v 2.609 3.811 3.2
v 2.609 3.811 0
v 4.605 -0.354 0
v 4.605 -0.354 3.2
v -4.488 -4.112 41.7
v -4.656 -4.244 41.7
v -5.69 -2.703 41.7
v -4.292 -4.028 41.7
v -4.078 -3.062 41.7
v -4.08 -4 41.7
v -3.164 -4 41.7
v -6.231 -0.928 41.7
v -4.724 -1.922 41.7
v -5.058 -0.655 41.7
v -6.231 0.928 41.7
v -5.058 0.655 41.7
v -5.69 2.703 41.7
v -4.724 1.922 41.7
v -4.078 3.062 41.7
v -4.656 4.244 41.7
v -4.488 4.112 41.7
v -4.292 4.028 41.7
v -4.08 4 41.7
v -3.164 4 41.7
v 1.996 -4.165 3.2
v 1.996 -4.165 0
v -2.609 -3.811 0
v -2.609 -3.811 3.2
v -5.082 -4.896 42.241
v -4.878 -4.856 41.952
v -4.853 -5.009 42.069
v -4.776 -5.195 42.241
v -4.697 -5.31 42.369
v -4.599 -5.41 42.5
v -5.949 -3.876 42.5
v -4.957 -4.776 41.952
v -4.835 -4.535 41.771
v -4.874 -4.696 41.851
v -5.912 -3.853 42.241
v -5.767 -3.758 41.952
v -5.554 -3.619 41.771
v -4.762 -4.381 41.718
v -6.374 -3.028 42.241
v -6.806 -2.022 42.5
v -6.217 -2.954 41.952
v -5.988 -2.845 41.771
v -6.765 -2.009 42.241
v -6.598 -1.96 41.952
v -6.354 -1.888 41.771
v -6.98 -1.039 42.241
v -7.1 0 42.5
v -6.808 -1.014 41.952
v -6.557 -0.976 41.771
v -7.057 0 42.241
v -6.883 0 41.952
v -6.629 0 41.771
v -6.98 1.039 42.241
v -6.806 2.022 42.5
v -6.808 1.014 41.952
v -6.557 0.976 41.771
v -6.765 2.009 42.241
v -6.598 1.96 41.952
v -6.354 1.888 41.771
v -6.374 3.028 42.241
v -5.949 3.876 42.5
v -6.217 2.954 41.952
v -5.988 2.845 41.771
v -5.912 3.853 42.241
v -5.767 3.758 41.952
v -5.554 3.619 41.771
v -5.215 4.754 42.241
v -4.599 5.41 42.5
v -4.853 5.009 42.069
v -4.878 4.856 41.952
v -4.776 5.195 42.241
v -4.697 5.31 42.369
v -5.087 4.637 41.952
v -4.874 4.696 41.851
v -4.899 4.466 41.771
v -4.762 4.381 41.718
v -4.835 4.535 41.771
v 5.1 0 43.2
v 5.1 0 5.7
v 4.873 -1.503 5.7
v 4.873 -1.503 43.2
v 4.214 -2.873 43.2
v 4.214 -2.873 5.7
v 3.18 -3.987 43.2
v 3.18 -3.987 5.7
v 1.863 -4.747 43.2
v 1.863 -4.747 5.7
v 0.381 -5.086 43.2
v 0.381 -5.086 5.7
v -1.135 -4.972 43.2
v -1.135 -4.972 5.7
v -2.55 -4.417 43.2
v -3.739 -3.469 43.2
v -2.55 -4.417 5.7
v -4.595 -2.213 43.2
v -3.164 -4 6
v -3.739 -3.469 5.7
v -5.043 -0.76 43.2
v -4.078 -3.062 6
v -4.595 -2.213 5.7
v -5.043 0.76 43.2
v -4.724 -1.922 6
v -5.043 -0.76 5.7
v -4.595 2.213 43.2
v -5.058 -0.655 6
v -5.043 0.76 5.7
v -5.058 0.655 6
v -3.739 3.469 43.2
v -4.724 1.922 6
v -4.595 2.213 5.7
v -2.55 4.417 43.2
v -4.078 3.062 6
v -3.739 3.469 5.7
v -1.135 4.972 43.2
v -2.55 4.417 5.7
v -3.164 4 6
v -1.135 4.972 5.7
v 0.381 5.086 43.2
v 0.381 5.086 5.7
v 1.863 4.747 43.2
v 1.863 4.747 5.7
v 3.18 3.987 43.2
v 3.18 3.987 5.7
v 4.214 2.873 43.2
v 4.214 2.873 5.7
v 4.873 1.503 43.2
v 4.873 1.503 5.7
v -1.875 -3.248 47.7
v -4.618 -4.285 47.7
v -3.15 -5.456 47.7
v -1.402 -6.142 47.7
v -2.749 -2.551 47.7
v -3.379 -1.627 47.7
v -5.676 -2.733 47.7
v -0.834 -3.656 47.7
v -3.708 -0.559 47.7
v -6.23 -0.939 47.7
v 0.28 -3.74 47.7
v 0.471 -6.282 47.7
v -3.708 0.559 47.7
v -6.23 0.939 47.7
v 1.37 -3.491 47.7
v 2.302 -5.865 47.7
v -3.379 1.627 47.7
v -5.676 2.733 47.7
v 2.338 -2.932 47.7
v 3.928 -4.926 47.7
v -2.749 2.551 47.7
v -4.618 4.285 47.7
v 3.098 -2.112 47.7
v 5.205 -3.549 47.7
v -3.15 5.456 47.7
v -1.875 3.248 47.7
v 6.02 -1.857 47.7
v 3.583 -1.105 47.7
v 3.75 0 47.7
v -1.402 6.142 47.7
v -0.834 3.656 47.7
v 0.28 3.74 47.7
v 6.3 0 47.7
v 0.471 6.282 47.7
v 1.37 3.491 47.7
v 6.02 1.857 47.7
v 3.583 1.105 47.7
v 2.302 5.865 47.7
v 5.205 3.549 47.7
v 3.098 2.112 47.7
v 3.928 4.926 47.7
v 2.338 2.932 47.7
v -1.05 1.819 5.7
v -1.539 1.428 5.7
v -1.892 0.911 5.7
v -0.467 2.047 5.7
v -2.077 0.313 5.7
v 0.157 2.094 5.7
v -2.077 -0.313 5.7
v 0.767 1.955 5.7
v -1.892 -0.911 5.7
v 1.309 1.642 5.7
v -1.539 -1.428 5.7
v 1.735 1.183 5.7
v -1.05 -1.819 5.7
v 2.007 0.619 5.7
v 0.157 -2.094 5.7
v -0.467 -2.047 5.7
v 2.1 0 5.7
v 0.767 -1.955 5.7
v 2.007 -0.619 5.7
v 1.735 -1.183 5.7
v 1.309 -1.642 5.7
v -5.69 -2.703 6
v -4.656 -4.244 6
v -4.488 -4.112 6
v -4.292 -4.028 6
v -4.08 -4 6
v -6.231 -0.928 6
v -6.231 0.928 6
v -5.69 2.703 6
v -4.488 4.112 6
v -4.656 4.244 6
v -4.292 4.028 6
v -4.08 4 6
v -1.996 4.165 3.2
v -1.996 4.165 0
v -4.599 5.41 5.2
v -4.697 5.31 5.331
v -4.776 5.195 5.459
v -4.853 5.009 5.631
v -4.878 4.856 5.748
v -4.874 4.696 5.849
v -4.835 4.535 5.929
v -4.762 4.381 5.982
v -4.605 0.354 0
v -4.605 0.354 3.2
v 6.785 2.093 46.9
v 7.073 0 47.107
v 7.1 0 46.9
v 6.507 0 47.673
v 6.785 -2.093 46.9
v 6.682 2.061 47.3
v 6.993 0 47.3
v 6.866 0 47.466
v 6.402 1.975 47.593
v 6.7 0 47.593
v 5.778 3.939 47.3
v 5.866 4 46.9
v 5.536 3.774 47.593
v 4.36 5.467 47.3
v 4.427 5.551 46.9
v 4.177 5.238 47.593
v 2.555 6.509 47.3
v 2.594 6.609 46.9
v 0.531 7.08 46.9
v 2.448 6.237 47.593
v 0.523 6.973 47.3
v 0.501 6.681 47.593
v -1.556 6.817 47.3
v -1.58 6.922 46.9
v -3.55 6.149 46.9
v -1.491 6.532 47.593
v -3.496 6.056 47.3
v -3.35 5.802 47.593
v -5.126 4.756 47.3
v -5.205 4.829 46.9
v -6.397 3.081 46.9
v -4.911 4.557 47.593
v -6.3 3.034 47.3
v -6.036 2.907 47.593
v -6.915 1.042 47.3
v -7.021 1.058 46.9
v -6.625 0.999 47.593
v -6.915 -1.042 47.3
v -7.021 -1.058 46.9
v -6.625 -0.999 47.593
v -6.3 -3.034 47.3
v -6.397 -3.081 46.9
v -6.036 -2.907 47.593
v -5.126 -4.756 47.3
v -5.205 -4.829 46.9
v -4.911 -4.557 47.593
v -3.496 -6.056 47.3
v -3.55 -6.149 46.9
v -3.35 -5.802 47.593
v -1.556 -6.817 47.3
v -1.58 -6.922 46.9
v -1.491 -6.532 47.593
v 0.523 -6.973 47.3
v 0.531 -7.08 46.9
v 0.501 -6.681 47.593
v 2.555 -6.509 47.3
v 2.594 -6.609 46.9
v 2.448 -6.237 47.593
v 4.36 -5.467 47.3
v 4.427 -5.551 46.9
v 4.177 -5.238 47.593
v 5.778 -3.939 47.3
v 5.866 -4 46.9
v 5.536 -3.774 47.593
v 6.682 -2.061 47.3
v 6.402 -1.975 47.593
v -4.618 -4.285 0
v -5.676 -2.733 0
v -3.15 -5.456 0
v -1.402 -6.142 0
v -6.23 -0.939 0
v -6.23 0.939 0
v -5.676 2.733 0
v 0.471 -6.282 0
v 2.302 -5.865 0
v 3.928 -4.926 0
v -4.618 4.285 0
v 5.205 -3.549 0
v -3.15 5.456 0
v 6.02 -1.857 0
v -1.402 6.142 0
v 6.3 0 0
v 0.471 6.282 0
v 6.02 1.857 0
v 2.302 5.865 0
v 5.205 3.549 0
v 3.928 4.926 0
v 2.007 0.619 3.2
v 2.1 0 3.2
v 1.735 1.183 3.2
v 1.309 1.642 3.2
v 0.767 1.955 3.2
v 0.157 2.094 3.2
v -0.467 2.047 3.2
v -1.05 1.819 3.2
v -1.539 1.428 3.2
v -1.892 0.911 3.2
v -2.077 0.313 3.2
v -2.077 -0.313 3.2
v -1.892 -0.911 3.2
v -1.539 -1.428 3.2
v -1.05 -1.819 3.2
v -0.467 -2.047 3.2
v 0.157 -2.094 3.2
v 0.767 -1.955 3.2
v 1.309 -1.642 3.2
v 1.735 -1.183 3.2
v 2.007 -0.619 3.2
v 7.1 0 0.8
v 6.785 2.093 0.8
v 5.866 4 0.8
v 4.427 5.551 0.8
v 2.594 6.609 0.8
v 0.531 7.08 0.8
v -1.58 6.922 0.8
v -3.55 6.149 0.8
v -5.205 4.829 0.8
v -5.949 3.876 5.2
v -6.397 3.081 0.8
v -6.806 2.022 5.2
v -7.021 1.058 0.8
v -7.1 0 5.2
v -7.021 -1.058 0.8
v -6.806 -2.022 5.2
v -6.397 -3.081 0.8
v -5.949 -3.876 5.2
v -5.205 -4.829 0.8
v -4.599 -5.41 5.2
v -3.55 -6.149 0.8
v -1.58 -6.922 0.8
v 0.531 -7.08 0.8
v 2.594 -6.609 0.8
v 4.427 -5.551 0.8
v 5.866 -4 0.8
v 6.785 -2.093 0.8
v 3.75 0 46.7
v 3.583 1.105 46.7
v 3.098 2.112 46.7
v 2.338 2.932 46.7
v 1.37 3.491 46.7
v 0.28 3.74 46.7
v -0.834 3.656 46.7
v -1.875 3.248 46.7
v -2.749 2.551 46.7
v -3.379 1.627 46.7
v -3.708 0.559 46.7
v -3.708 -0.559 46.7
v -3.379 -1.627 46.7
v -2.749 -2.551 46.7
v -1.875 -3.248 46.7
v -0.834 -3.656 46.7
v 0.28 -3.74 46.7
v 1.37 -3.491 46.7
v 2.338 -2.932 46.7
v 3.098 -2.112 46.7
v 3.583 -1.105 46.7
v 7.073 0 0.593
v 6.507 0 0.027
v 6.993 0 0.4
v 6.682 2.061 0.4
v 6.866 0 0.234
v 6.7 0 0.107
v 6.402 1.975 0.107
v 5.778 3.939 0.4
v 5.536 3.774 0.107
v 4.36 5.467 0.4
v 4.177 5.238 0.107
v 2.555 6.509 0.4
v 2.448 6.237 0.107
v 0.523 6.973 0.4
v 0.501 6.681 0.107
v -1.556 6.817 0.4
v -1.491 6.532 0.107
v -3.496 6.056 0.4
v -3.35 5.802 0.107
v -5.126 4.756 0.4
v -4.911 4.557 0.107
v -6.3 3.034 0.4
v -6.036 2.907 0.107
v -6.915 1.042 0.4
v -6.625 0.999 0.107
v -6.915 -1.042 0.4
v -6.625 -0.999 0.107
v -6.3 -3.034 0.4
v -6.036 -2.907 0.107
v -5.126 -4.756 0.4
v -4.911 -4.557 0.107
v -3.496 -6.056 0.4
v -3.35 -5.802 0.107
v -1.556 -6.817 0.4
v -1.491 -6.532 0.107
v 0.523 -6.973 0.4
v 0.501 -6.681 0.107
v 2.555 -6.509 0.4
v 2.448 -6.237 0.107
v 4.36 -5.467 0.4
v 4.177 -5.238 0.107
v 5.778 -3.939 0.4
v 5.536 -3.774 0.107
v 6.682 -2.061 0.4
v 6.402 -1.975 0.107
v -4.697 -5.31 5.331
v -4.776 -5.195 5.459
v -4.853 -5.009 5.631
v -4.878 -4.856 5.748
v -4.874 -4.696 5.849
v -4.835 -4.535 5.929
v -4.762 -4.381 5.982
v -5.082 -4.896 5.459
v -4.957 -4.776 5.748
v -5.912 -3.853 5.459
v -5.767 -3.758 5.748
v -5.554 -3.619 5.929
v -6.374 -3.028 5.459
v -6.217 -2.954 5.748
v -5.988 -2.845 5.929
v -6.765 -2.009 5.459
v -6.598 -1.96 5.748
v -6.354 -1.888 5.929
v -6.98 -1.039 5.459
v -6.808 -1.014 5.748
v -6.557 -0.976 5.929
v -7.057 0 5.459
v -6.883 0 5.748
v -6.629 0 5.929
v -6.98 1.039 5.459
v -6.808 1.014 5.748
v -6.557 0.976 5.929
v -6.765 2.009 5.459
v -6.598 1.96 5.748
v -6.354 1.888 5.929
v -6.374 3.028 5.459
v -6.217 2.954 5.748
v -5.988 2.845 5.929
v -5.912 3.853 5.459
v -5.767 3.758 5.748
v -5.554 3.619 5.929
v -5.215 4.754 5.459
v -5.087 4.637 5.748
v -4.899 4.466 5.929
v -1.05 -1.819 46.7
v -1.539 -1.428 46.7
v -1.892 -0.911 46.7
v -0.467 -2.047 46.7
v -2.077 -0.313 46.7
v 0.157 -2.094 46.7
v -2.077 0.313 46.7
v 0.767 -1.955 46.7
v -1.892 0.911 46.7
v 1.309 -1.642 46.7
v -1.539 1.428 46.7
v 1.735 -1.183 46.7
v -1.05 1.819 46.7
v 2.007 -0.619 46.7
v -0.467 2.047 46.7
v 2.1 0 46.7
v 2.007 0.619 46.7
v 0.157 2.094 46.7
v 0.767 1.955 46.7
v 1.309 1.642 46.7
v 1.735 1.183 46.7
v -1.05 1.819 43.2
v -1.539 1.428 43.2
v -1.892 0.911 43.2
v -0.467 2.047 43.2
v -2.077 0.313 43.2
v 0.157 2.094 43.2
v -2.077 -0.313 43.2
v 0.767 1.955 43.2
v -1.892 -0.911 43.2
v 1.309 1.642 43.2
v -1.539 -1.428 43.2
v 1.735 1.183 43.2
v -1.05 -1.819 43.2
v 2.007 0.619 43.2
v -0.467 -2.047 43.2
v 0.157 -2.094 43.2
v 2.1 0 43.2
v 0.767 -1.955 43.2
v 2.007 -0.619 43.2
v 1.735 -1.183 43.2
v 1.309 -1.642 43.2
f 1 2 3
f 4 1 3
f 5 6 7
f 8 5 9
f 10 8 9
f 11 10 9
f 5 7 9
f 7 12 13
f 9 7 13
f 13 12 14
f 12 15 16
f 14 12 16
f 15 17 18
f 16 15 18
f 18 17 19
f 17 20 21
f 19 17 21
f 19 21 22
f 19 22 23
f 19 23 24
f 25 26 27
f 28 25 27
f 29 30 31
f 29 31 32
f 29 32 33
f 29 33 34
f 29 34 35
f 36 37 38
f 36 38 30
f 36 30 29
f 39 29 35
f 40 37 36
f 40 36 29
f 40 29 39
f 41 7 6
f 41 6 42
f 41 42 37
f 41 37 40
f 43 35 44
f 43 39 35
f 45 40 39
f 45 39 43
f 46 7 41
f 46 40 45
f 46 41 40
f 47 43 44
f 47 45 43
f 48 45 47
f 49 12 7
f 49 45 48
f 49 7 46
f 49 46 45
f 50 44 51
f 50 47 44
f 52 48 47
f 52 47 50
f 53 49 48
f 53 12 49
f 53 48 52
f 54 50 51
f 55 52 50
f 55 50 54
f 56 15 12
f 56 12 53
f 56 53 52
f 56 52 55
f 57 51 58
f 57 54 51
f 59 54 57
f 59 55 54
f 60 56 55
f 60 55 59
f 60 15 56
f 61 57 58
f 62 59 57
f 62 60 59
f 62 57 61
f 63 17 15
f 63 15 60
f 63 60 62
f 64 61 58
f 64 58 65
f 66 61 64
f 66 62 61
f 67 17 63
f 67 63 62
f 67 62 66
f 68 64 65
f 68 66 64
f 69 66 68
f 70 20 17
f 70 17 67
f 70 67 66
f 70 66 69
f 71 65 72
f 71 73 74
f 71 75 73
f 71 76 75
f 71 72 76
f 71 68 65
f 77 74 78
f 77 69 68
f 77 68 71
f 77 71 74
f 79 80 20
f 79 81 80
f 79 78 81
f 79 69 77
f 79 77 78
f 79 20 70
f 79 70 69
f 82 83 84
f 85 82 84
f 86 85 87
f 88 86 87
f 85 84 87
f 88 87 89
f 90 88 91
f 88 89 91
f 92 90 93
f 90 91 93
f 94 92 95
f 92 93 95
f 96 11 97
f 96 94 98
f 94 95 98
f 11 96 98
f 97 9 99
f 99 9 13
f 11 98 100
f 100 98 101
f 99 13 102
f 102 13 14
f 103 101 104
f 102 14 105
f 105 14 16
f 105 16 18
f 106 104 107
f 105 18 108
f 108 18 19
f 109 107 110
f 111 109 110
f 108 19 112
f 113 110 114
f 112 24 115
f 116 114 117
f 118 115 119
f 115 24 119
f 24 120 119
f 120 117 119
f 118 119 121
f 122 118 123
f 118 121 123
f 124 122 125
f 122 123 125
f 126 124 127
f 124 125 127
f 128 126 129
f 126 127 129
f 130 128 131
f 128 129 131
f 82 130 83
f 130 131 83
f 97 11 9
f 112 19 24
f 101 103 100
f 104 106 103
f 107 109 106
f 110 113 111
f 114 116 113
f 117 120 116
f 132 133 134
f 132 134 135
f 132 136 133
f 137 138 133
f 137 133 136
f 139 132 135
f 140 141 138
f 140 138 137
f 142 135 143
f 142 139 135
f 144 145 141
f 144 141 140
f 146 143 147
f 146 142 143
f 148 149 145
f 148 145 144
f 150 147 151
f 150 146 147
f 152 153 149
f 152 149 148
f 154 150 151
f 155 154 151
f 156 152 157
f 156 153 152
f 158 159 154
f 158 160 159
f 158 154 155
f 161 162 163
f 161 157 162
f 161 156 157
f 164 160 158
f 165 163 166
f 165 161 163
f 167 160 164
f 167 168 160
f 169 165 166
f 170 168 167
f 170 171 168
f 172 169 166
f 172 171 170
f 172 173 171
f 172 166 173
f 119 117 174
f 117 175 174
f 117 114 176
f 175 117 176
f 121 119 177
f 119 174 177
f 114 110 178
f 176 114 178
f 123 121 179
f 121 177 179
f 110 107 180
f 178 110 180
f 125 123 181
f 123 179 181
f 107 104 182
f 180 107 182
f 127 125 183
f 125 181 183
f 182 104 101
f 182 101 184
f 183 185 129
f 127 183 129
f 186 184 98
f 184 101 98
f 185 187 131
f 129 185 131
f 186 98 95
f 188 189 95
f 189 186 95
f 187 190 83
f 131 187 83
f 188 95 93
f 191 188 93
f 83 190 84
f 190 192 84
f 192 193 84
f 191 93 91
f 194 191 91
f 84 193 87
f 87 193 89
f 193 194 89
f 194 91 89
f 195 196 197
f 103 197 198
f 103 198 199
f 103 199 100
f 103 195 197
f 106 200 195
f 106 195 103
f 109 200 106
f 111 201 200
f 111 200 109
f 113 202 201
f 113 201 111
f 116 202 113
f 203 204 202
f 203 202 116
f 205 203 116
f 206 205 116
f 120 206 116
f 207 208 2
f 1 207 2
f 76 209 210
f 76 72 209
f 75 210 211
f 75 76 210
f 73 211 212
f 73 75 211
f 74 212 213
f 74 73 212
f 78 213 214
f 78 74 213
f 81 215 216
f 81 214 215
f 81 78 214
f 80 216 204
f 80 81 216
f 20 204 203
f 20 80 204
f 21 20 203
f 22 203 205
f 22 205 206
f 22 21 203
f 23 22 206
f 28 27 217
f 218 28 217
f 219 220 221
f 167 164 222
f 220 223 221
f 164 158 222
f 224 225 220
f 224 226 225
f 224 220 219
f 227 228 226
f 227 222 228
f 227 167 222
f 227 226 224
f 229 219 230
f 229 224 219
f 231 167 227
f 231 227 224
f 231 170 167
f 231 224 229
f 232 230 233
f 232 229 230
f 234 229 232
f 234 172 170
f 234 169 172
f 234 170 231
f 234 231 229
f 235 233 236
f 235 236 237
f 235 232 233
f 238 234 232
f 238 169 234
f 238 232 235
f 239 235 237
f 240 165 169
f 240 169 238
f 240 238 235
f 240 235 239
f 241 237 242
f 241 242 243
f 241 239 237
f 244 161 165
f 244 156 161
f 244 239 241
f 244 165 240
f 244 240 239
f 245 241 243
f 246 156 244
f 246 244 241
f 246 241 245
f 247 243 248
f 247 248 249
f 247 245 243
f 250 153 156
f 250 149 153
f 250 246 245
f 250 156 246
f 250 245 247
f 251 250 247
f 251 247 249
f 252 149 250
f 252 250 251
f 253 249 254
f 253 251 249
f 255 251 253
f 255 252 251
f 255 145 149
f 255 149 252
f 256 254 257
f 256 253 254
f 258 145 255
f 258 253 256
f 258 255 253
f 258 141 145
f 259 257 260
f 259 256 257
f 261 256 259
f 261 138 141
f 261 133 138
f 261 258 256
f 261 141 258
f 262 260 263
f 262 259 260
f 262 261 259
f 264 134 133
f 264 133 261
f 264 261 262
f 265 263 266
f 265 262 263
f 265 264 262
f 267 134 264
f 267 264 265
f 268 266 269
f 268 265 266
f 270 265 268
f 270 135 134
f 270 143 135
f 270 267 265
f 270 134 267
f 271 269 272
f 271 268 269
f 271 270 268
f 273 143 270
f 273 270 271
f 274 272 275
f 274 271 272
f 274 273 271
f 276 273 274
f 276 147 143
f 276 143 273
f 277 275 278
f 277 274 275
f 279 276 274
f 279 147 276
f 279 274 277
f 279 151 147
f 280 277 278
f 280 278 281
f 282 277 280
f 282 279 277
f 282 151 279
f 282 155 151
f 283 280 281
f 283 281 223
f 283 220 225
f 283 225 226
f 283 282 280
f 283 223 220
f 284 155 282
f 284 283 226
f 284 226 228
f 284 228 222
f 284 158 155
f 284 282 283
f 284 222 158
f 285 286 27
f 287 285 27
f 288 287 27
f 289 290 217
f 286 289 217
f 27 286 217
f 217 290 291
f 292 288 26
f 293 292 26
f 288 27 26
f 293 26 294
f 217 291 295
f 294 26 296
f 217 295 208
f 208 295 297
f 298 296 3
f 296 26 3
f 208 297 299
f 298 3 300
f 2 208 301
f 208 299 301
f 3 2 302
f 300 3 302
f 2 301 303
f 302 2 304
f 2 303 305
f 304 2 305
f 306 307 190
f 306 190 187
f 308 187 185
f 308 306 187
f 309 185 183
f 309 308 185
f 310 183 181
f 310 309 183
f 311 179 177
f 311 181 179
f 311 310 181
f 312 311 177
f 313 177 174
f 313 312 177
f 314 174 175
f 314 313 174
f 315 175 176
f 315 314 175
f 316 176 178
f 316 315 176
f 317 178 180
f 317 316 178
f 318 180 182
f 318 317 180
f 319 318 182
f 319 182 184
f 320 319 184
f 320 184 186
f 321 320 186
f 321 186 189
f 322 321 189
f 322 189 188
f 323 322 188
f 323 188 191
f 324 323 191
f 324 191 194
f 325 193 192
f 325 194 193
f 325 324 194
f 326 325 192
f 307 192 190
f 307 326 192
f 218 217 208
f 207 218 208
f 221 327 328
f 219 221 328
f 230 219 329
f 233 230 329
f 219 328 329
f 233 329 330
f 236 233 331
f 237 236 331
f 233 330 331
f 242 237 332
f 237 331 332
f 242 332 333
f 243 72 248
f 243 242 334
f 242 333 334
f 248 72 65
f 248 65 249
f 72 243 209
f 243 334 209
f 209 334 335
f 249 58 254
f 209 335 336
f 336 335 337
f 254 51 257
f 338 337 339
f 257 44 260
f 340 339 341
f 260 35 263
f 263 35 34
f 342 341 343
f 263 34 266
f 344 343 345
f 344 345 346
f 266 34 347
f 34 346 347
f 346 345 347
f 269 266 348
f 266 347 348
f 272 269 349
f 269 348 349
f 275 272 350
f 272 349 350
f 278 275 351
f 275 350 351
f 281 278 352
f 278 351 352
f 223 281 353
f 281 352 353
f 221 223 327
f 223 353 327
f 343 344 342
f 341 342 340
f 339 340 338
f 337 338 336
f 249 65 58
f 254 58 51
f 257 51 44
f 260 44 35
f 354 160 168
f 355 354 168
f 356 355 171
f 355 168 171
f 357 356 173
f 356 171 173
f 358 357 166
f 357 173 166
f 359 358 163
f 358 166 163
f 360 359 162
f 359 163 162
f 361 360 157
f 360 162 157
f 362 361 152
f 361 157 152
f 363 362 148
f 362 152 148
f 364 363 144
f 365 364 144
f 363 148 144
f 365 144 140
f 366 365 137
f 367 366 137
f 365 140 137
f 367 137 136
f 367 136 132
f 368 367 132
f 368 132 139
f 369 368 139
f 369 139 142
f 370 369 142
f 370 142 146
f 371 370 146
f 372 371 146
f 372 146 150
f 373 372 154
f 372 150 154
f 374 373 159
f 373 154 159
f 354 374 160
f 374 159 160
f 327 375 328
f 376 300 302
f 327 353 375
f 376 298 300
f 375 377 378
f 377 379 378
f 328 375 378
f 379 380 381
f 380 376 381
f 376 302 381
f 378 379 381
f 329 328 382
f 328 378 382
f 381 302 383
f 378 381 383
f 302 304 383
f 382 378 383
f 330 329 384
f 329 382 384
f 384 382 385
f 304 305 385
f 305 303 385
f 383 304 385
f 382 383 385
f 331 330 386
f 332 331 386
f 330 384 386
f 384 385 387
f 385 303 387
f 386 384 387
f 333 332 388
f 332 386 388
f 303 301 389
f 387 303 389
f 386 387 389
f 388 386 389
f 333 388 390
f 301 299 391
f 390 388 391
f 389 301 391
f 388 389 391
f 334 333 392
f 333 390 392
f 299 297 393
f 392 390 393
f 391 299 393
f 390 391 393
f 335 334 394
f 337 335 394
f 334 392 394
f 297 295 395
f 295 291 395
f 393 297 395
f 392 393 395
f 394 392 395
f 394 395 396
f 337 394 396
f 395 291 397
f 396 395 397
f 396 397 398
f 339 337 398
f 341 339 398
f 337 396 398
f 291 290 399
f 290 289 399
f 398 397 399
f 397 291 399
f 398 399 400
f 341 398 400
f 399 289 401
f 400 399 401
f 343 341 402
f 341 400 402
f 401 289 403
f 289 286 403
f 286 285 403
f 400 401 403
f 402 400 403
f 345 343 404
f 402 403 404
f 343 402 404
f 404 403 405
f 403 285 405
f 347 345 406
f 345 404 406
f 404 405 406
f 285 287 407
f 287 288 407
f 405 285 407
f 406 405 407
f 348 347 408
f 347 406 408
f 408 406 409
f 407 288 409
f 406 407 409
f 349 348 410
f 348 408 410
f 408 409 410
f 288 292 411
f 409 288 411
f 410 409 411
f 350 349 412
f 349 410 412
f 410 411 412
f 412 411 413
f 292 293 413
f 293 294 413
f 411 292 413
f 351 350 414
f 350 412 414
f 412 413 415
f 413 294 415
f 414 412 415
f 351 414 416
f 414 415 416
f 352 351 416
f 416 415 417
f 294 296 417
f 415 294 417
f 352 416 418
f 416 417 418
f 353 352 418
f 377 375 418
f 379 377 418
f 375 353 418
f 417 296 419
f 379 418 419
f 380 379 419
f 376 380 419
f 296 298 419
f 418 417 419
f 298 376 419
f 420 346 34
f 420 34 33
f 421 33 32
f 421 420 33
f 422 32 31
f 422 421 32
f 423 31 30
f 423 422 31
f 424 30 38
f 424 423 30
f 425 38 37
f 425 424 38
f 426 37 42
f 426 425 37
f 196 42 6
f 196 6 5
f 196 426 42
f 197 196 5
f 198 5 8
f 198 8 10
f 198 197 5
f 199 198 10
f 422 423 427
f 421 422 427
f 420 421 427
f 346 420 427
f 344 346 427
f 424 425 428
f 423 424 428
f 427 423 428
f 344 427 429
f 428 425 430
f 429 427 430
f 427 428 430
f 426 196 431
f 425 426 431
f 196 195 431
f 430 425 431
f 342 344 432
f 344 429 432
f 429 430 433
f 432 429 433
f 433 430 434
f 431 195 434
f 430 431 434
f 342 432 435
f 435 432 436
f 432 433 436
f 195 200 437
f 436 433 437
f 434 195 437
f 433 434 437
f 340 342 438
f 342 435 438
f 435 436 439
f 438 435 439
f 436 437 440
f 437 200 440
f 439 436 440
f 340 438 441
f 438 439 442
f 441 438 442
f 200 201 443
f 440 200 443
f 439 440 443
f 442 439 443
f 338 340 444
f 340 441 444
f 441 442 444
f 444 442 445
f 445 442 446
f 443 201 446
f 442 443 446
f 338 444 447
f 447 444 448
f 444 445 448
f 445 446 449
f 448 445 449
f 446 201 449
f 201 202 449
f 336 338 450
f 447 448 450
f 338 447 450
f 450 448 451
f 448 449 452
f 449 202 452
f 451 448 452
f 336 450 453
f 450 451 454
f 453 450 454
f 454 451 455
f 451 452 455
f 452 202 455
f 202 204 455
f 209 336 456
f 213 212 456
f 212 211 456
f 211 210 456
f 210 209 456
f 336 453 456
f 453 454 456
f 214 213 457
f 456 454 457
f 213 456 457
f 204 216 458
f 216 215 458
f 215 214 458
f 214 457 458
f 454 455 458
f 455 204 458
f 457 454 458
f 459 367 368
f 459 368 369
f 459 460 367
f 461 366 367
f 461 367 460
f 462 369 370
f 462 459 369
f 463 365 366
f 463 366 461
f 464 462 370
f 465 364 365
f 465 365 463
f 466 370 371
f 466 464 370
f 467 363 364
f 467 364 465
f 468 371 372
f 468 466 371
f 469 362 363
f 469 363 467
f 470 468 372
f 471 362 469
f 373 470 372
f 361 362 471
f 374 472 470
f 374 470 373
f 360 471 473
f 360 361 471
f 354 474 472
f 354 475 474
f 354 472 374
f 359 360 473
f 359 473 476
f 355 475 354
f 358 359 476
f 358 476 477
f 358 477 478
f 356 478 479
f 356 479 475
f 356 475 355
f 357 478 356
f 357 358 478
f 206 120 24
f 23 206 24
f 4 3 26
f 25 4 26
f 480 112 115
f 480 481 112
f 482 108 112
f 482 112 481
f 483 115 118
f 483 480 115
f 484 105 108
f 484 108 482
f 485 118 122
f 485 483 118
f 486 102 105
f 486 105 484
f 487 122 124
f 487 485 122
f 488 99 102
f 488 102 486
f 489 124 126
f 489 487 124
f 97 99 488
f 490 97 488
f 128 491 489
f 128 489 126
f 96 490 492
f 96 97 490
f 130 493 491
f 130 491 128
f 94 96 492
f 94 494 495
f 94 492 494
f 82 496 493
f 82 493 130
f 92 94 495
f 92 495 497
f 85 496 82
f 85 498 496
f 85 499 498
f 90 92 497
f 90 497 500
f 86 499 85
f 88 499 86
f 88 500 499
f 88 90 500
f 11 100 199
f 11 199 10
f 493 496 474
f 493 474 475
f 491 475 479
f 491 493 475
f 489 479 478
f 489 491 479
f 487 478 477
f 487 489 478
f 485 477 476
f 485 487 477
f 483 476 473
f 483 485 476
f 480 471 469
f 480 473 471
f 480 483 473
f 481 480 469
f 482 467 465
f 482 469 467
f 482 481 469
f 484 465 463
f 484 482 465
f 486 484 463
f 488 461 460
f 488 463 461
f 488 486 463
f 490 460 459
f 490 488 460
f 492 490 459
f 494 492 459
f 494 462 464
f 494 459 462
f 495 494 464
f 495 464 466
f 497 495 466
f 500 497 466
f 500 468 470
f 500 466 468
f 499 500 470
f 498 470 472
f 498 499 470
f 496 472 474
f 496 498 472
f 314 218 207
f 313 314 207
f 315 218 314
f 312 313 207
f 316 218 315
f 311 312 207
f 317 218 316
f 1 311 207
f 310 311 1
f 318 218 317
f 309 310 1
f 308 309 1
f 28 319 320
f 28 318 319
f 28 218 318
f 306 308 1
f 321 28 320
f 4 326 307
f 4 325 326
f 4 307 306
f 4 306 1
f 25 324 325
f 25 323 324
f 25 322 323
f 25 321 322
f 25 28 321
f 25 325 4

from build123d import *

# Parameters (mm, degrees)
F0_R          = 7.1
F0_R_2        = 2.1
F1_DEPTH      = 47.7
F3_DEPTH      = 3.2
F4_R          = 3.75
F5_DEPTH      = 1
F6_W          = 8
F6_H          = 35.7
F7_DEPTH      = 25
F9_START      = -2.5
F8_R          = 5.1
F9_DEPTH      = 37.5
F10_T1_DEPTH  = 35.7
F10_T8_ANGLE  = 100.8666218277
F10_T14_ANGLE = 100.8666218277
F10_T23_DEPTH = 40.4388611997
F10_T27_ANGLE = 100.8666218277
F10_T34_ANGLE = 100.8666218277
F10_T38_DEPTH = 40.4388611997
F10_T45_DEPTH = 40.4388611997
F10_T49_ANGLE = 100.8666218277
F10_T56_DEPTH = 40.4388611997
F10_T60_ANGLE = 100.8666218277


# Not quite as in the source:
# - a fillet or chamfer that OpenCascade refuses, or shapes differently, is made with other operations: its cross-section is extruded or revolved along the edge and cut away or added


with BuildPart() as f1:
    # F0 (on Top) → F1 (new body)
    with BuildSketch(Plane.XY):
        Circle(F0_R)
        Circle(F0_R_2, mode=Mode.SUBTRACT)
    extrude(amount=F1_DEPTH)

    # F2 (on face) → F3 (cut)
    with BuildSketch(Plane(origin=(0, 0, 0), x_dir=(1, 0, 0), z_dir=(0, 0, -1))):
        Polygon((2.6088002978, -3.8114950268), (4.6052516685, 0.3535398179), (1.9964513707, 4.1650348447), (-2.6088002978, 3.8114950268), (-4.6052516685, -0.3535398179), (-1.9964513707, -4.1650348447), align=None)
    extrude(amount=-F3_DEPTH, mode=Mode.SUBTRACT)

    # F4 (on face) → F5 (cut)
    with BuildSketch(Plane.XY.offset(47.7)):
        Circle(F4_R)
    extrude(amount=-F5_DEPTH, mode=Mode.SUBTRACT)

    # F6 (on Right) → F7 (cut)
    with BuildSketch(Plane.YZ):
        with Locations((0, 23.85)):
            Rectangle(F6_W, F6_H)
    extrude(amount=-F7_DEPTH, mode=Mode.SUBTRACT)

    # F8 (on face) → F9 (cut)
    with BuildSketch(Plane(origin=(0, 0, 3.2), x_dir=(1, 0, 0), z_dir=(0, 0, -1)).offset(F9_START)):
        Circle(F8_R)
    extrude(amount=-F9_DEPTH, mode=Mode.SUBTRACT)

    # F10: fillet of radius 0.8 on 6 edges, made by hand

    # F10_s2 → F10_t1 (cut)
    with BuildSketch(Plane.XY.offset(6)):
        with BuildLine():
            ThreePointArc((-4.5985924101, 5.4095238095), (-4.831313661, 4.5239737763), (-4.0804411526, 4))
            Line((-4.0804411526, 4), (-5.8660037504, 4))
            ThreePointArc((-5.8660037504, 4), (-5.279548517, 4.747248409), (-4.5985924101, 5.4095238095))
        make_face()
        with BuildLine():
            ThreePointArc((-4.5985924101, -5.4095238095), (-4.831313661, -4.5239737763), (-4.0804411526, -4))
            Line((-4.0804411526, -4), (-5.8660037504, -4))
            ThreePointArc((-5.8660037504, -4), (-5.279548517, -4.747248409), (-4.5985924101, -5.4095238095))
        make_face()
    extrude(amount=F10_T1_DEPTH, mode=Mode.SUBTRACT)

    # F10_s3 → F10_t4 (revolve, cut)
    with BuildSketch(Plane.XZ):
        with BuildLine():
            ThreePointArc((7.1, 0.8), (6.8656854249, 0.2343145751), (6.3, 0))
            Line((6.3, 0), (7.1, 0))
            Line((7.1, 0), (7.1, 0.8))
        make_face()
    revolve(axis=Axis((0, 0, 0), (0, 0, 1)), mode=Mode.SUBTRACT)


with BuildPart() as f10_tool6:
    # F10_s7 → F10_t8 (revolve)
    with BuildSketch(Plane(origin=(0, 0, 0), x_dir=(0, 0, 1), z_dir=(0.7708837014, -0.6369759171, 0))):
        with BuildLine():
            ThreePointArc((5.2, 7.1), (5.7656854249, 6.8656854249), (6, 6.3))
            Line((6, 6.3), (6, 7.1))
            Line((6, 7.1), (5.2, 7.1))
        make_face()
    revolve(axis=Axis((0, 0, 6), (0, 0, -1)), revolution_arc=F10_T8_ANGLE)

    split(bisect_by=Plane.XZ.offset(4), keep=Keep.BOTTOM)

    split(bisect_by=Plane.XZ.offset(-4), keep=Keep.TOP)


with BuildPart() as f1_1:
    add(f1.part)

    # F10_t5: cut F10_tool6
    add(f10_tool6.part, mode=Mode.SUBTRACT)


with BuildPart() as f10_tool12:
    # F10_s13 → F10_t14 (revolve)
    with BuildSketch(Plane(origin=(0, 0, 0), x_dir=(0, 0, 1), z_dir=(0.7708837014, -0.6369759171, 0))):
        with BuildLine():
            ThreePointArc((42.5, 7.1), (41.9343145751, 6.8656854249), (41.7, 6.3))
            Line((41.7, 6.3), (41.7, 7.1))
            Line((41.7, 7.1), (42.5, 7.1))
        make_face()
    revolve(axis=Axis((0, 0, 41.7), (0, 0, -1)), revolution_arc=F10_T14_ANGLE)

    split(bisect_by=Plane.XZ.offset(4), keep=Keep.BOTTOM)

    split(bisect_by=Plane.XZ.offset(-4), keep=Keep.TOP)


with BuildPart() as f1_2:
    add(f1_1.part)

    # F10_t11: cut F10_tool12
    add(f10_tool12.part, mode=Mode.SUBTRACT)

    # F10_s17 → F10_t18 (revolve, cut)
    with BuildSketch(Plane.XZ):
        with BuildLine():
            ThreePointArc((7.1, 46.9), (6.8656854249, 47.4656854249), (6.3, 47.7))
            Line((6.3, 47.7), (7.1, 47.7))
            Line((7.1, 47.7), (7.1, 46.9))
        make_face()
    revolve(axis=Axis((0, 0, 47.7), (0, 0, 1)), mode=Mode.SUBTRACT)


with BuildPart() as f10_tool21:
    # F10_s22 → F10_t23 (new body)
    with BuildSketch(Plane.XY.offset(41.7)):
        with BuildLine():
            ThreePointArc((-4.5985924101, -5.4095238095), (-4.831313661, -4.5239737763), (-4.0804411526, -4))
            Line((-4.0804411526, -4), (-5.8660037504, -4))
            ThreePointArc((-5.8660037504, -4), (-5.279548517, -4.747248409), (-4.5985924101, -5.4095238095))
        make_face()
    extrude(amount=-F10_T23_DEPTH)

    split(bisect_by=Plane.XY.offset(6), keep=Keep.BOTTOM)


with BuildPart() as f10_tool25:
    # F10_s26 → F10_t27 (revolve)
    with BuildSketch(Plane(origin=(0, 0, 0), x_dir=(0, 0, 1), z_dir=(0.7708837014, -0.6369759171, 0))):
        with BuildLine():
            ThreePointArc((5.2, 7.1), (5.7656854249, 6.8656854249), (6, 6.3))
            Line((6, 6.3), (6, 7.1))
            Line((6, 7.1), (5.2, 7.1))
        make_face()
    revolve(axis=Axis((0, 0, 6), (0, 0, -1)), revolution_arc=F10_T27_ANGLE)

    split(bisect_by=Plane.XZ.offset(4), keep=Keep.TOP)


with BuildPart() as f10_tool21_1:
    add(f10_tool21.part)

    # F10_t29: intersect F10_tool25
    add(f10_tool25.part, mode=Mode.INTERSECT)


with BuildPart() as f1_3:
    add(f1_2.part)

    # F10_t19: cut F10_tool21
    add(f10_tool21_1.part, mode=Mode.SUBTRACT)


with BuildPart() as f10_tool32:
    # F10_s33 → F10_t34 (revolve)
    with BuildSketch(Plane(origin=(0, 0, 0), x_dir=(0, 0, 1), z_dir=(0.7708837014, -0.6369759171, 0))):
        with BuildLine():
            ThreePointArc((5.2, 7.1), (5.7656854249, 6.8656854249), (6, 6.3))
            Line((6, 6.3), (6, 7.1))
            Line((6, 7.1), (5.2, 7.1))
        make_face()
    revolve(axis=Axis((0, 0, 6), (0, 0, -1)), revolution_arc=F10_T34_ANGLE)

    split(bisect_by=Plane.XZ.offset(-4), keep=Keep.BOTTOM)


with BuildPart() as f10_tool36:
    # F10_s37 → F10_t38 (new body)
    with BuildSketch(Plane.XY.offset(41.7)):
        with BuildLine():
            ThreePointArc((-4.5985924101, 5.4095238095), (-4.831313661, 4.5239737763), (-4.0804411526, 4))
            Line((-4.0804411526, 4), (-5.8660037504, 4))
            ThreePointArc((-5.8660037504, 4), (-5.279548517, 4.747248409), (-4.5985924101, 5.4095238095))
        make_face()
    extrude(amount=-F10_T38_DEPTH)

    split(bisect_by=Plane.XY.offset(6), keep=Keep.BOTTOM)


with BuildPart() as f10_tool32_1:
    add(f10_tool32.part)

    # F10_t40: intersect F10_tool36
    add(f10_tool36.part, mode=Mode.INTERSECT)


with BuildPart() as f1_4:
    add(f1_3.part)

    # F10_t30: cut F10_tool32
    add(f10_tool32_1.part, mode=Mode.SUBTRACT)


with BuildPart() as f10_tool43:
    # F10_s44 → F10_t45 (new body)
    with BuildSketch(Plane.XY.offset(46.4388611997)):
        with BuildLine():
            ThreePointArc((-4.5985924101, -5.4095238095), (-4.831313661, -4.5239737763), (-4.0804411526, -4))
            Line((-4.0804411526, -4), (-5.8660037504, -4))
            ThreePointArc((-5.8660037504, -4), (-5.279548517, -4.747248409), (-4.5985924101, -5.4095238095))
        make_face()
    extrude(amount=-F10_T45_DEPTH)

    split(bisect_by=Plane.XY.offset(41.7), keep=Keep.TOP)


with BuildPart() as f10_tool47:
    # F10_s48 → F10_t49 (revolve)
    with BuildSketch(Plane(origin=(0, 0, 0), x_dir=(0, 0, 1), z_dir=(0.7708837014, -0.6369759171, 0))):
        with BuildLine():
            ThreePointArc((42.5, 7.1), (41.9343145751, 6.8656854249), (41.7, 6.3))
            Line((41.7, 6.3), (41.7, 7.1))
            Line((41.7, 7.1), (42.5, 7.1))
        make_face()
    revolve(axis=Axis((0, 0, 41.7), (0, 0, -1)), revolution_arc=F10_T49_ANGLE)

    split(bisect_by=Plane.XZ.offset(4), keep=Keep.TOP)


with BuildPart() as f10_tool43_1:
    add(f10_tool43.part)

    # F10_t51: intersect F10_tool47
    add(f10_tool47.part, mode=Mode.INTERSECT)


with BuildPart() as f1_5:
    add(f1_4.part)

    # F10_t41: cut F10_tool43
    add(f10_tool43_1.part, mode=Mode.SUBTRACT)


with BuildPart() as f10_tool54:
    # F10_s55 → F10_t56 (new body)
    with BuildSketch(Plane.XY.offset(46.4388611997)):
        with BuildLine():
            ThreePointArc((-4.5985924101, 5.4095238095), (-4.831313661, 4.5239737763), (-4.0804411526, 4))
            Line((-4.0804411526, 4), (-5.8660037504, 4))
            ThreePointArc((-5.8660037504, 4), (-5.279548517, 4.747248409), (-4.5985924101, 5.4095238095))
        make_face()
    extrude(amount=-F10_T56_DEPTH)

    split(bisect_by=Plane.XY.offset(41.7), keep=Keep.TOP)


with BuildPart() as f10_tool58:
    # F10_s59 → F10_t60 (revolve)
    with BuildSketch(Plane(origin=(0, 0, 0), x_dir=(0, 0, 1), z_dir=(0.7708837014, -0.6369759171, 0))):
        with BuildLine():
            ThreePointArc((42.5, 7.1), (41.9343145751, 6.8656854249), (41.7, 6.3))
            Line((41.7, 6.3), (41.7, 7.1))
            Line((41.7, 7.1), (42.5, 7.1))
        make_face()
    revolve(axis=Axis((0, 0, 41.7), (0, 0, -1)), revolution_arc=F10_T60_ANGLE)

    split(bisect_by=Plane.XZ.offset(-4), keep=Keep.BOTTOM)


with BuildPart() as f10_tool54_1:
    add(f10_tool54.part)

    # F10_t62: intersect F10_tool58
    add(f10_tool58.part, mode=Mode.INTERSECT)


with BuildPart() as f1_6:
    add(f1_5.part)

    # F10_t52: cut F10_tool54
    add(f10_tool54_1.part, mode=Mode.SUBTRACT)


solid = f1_6.part
